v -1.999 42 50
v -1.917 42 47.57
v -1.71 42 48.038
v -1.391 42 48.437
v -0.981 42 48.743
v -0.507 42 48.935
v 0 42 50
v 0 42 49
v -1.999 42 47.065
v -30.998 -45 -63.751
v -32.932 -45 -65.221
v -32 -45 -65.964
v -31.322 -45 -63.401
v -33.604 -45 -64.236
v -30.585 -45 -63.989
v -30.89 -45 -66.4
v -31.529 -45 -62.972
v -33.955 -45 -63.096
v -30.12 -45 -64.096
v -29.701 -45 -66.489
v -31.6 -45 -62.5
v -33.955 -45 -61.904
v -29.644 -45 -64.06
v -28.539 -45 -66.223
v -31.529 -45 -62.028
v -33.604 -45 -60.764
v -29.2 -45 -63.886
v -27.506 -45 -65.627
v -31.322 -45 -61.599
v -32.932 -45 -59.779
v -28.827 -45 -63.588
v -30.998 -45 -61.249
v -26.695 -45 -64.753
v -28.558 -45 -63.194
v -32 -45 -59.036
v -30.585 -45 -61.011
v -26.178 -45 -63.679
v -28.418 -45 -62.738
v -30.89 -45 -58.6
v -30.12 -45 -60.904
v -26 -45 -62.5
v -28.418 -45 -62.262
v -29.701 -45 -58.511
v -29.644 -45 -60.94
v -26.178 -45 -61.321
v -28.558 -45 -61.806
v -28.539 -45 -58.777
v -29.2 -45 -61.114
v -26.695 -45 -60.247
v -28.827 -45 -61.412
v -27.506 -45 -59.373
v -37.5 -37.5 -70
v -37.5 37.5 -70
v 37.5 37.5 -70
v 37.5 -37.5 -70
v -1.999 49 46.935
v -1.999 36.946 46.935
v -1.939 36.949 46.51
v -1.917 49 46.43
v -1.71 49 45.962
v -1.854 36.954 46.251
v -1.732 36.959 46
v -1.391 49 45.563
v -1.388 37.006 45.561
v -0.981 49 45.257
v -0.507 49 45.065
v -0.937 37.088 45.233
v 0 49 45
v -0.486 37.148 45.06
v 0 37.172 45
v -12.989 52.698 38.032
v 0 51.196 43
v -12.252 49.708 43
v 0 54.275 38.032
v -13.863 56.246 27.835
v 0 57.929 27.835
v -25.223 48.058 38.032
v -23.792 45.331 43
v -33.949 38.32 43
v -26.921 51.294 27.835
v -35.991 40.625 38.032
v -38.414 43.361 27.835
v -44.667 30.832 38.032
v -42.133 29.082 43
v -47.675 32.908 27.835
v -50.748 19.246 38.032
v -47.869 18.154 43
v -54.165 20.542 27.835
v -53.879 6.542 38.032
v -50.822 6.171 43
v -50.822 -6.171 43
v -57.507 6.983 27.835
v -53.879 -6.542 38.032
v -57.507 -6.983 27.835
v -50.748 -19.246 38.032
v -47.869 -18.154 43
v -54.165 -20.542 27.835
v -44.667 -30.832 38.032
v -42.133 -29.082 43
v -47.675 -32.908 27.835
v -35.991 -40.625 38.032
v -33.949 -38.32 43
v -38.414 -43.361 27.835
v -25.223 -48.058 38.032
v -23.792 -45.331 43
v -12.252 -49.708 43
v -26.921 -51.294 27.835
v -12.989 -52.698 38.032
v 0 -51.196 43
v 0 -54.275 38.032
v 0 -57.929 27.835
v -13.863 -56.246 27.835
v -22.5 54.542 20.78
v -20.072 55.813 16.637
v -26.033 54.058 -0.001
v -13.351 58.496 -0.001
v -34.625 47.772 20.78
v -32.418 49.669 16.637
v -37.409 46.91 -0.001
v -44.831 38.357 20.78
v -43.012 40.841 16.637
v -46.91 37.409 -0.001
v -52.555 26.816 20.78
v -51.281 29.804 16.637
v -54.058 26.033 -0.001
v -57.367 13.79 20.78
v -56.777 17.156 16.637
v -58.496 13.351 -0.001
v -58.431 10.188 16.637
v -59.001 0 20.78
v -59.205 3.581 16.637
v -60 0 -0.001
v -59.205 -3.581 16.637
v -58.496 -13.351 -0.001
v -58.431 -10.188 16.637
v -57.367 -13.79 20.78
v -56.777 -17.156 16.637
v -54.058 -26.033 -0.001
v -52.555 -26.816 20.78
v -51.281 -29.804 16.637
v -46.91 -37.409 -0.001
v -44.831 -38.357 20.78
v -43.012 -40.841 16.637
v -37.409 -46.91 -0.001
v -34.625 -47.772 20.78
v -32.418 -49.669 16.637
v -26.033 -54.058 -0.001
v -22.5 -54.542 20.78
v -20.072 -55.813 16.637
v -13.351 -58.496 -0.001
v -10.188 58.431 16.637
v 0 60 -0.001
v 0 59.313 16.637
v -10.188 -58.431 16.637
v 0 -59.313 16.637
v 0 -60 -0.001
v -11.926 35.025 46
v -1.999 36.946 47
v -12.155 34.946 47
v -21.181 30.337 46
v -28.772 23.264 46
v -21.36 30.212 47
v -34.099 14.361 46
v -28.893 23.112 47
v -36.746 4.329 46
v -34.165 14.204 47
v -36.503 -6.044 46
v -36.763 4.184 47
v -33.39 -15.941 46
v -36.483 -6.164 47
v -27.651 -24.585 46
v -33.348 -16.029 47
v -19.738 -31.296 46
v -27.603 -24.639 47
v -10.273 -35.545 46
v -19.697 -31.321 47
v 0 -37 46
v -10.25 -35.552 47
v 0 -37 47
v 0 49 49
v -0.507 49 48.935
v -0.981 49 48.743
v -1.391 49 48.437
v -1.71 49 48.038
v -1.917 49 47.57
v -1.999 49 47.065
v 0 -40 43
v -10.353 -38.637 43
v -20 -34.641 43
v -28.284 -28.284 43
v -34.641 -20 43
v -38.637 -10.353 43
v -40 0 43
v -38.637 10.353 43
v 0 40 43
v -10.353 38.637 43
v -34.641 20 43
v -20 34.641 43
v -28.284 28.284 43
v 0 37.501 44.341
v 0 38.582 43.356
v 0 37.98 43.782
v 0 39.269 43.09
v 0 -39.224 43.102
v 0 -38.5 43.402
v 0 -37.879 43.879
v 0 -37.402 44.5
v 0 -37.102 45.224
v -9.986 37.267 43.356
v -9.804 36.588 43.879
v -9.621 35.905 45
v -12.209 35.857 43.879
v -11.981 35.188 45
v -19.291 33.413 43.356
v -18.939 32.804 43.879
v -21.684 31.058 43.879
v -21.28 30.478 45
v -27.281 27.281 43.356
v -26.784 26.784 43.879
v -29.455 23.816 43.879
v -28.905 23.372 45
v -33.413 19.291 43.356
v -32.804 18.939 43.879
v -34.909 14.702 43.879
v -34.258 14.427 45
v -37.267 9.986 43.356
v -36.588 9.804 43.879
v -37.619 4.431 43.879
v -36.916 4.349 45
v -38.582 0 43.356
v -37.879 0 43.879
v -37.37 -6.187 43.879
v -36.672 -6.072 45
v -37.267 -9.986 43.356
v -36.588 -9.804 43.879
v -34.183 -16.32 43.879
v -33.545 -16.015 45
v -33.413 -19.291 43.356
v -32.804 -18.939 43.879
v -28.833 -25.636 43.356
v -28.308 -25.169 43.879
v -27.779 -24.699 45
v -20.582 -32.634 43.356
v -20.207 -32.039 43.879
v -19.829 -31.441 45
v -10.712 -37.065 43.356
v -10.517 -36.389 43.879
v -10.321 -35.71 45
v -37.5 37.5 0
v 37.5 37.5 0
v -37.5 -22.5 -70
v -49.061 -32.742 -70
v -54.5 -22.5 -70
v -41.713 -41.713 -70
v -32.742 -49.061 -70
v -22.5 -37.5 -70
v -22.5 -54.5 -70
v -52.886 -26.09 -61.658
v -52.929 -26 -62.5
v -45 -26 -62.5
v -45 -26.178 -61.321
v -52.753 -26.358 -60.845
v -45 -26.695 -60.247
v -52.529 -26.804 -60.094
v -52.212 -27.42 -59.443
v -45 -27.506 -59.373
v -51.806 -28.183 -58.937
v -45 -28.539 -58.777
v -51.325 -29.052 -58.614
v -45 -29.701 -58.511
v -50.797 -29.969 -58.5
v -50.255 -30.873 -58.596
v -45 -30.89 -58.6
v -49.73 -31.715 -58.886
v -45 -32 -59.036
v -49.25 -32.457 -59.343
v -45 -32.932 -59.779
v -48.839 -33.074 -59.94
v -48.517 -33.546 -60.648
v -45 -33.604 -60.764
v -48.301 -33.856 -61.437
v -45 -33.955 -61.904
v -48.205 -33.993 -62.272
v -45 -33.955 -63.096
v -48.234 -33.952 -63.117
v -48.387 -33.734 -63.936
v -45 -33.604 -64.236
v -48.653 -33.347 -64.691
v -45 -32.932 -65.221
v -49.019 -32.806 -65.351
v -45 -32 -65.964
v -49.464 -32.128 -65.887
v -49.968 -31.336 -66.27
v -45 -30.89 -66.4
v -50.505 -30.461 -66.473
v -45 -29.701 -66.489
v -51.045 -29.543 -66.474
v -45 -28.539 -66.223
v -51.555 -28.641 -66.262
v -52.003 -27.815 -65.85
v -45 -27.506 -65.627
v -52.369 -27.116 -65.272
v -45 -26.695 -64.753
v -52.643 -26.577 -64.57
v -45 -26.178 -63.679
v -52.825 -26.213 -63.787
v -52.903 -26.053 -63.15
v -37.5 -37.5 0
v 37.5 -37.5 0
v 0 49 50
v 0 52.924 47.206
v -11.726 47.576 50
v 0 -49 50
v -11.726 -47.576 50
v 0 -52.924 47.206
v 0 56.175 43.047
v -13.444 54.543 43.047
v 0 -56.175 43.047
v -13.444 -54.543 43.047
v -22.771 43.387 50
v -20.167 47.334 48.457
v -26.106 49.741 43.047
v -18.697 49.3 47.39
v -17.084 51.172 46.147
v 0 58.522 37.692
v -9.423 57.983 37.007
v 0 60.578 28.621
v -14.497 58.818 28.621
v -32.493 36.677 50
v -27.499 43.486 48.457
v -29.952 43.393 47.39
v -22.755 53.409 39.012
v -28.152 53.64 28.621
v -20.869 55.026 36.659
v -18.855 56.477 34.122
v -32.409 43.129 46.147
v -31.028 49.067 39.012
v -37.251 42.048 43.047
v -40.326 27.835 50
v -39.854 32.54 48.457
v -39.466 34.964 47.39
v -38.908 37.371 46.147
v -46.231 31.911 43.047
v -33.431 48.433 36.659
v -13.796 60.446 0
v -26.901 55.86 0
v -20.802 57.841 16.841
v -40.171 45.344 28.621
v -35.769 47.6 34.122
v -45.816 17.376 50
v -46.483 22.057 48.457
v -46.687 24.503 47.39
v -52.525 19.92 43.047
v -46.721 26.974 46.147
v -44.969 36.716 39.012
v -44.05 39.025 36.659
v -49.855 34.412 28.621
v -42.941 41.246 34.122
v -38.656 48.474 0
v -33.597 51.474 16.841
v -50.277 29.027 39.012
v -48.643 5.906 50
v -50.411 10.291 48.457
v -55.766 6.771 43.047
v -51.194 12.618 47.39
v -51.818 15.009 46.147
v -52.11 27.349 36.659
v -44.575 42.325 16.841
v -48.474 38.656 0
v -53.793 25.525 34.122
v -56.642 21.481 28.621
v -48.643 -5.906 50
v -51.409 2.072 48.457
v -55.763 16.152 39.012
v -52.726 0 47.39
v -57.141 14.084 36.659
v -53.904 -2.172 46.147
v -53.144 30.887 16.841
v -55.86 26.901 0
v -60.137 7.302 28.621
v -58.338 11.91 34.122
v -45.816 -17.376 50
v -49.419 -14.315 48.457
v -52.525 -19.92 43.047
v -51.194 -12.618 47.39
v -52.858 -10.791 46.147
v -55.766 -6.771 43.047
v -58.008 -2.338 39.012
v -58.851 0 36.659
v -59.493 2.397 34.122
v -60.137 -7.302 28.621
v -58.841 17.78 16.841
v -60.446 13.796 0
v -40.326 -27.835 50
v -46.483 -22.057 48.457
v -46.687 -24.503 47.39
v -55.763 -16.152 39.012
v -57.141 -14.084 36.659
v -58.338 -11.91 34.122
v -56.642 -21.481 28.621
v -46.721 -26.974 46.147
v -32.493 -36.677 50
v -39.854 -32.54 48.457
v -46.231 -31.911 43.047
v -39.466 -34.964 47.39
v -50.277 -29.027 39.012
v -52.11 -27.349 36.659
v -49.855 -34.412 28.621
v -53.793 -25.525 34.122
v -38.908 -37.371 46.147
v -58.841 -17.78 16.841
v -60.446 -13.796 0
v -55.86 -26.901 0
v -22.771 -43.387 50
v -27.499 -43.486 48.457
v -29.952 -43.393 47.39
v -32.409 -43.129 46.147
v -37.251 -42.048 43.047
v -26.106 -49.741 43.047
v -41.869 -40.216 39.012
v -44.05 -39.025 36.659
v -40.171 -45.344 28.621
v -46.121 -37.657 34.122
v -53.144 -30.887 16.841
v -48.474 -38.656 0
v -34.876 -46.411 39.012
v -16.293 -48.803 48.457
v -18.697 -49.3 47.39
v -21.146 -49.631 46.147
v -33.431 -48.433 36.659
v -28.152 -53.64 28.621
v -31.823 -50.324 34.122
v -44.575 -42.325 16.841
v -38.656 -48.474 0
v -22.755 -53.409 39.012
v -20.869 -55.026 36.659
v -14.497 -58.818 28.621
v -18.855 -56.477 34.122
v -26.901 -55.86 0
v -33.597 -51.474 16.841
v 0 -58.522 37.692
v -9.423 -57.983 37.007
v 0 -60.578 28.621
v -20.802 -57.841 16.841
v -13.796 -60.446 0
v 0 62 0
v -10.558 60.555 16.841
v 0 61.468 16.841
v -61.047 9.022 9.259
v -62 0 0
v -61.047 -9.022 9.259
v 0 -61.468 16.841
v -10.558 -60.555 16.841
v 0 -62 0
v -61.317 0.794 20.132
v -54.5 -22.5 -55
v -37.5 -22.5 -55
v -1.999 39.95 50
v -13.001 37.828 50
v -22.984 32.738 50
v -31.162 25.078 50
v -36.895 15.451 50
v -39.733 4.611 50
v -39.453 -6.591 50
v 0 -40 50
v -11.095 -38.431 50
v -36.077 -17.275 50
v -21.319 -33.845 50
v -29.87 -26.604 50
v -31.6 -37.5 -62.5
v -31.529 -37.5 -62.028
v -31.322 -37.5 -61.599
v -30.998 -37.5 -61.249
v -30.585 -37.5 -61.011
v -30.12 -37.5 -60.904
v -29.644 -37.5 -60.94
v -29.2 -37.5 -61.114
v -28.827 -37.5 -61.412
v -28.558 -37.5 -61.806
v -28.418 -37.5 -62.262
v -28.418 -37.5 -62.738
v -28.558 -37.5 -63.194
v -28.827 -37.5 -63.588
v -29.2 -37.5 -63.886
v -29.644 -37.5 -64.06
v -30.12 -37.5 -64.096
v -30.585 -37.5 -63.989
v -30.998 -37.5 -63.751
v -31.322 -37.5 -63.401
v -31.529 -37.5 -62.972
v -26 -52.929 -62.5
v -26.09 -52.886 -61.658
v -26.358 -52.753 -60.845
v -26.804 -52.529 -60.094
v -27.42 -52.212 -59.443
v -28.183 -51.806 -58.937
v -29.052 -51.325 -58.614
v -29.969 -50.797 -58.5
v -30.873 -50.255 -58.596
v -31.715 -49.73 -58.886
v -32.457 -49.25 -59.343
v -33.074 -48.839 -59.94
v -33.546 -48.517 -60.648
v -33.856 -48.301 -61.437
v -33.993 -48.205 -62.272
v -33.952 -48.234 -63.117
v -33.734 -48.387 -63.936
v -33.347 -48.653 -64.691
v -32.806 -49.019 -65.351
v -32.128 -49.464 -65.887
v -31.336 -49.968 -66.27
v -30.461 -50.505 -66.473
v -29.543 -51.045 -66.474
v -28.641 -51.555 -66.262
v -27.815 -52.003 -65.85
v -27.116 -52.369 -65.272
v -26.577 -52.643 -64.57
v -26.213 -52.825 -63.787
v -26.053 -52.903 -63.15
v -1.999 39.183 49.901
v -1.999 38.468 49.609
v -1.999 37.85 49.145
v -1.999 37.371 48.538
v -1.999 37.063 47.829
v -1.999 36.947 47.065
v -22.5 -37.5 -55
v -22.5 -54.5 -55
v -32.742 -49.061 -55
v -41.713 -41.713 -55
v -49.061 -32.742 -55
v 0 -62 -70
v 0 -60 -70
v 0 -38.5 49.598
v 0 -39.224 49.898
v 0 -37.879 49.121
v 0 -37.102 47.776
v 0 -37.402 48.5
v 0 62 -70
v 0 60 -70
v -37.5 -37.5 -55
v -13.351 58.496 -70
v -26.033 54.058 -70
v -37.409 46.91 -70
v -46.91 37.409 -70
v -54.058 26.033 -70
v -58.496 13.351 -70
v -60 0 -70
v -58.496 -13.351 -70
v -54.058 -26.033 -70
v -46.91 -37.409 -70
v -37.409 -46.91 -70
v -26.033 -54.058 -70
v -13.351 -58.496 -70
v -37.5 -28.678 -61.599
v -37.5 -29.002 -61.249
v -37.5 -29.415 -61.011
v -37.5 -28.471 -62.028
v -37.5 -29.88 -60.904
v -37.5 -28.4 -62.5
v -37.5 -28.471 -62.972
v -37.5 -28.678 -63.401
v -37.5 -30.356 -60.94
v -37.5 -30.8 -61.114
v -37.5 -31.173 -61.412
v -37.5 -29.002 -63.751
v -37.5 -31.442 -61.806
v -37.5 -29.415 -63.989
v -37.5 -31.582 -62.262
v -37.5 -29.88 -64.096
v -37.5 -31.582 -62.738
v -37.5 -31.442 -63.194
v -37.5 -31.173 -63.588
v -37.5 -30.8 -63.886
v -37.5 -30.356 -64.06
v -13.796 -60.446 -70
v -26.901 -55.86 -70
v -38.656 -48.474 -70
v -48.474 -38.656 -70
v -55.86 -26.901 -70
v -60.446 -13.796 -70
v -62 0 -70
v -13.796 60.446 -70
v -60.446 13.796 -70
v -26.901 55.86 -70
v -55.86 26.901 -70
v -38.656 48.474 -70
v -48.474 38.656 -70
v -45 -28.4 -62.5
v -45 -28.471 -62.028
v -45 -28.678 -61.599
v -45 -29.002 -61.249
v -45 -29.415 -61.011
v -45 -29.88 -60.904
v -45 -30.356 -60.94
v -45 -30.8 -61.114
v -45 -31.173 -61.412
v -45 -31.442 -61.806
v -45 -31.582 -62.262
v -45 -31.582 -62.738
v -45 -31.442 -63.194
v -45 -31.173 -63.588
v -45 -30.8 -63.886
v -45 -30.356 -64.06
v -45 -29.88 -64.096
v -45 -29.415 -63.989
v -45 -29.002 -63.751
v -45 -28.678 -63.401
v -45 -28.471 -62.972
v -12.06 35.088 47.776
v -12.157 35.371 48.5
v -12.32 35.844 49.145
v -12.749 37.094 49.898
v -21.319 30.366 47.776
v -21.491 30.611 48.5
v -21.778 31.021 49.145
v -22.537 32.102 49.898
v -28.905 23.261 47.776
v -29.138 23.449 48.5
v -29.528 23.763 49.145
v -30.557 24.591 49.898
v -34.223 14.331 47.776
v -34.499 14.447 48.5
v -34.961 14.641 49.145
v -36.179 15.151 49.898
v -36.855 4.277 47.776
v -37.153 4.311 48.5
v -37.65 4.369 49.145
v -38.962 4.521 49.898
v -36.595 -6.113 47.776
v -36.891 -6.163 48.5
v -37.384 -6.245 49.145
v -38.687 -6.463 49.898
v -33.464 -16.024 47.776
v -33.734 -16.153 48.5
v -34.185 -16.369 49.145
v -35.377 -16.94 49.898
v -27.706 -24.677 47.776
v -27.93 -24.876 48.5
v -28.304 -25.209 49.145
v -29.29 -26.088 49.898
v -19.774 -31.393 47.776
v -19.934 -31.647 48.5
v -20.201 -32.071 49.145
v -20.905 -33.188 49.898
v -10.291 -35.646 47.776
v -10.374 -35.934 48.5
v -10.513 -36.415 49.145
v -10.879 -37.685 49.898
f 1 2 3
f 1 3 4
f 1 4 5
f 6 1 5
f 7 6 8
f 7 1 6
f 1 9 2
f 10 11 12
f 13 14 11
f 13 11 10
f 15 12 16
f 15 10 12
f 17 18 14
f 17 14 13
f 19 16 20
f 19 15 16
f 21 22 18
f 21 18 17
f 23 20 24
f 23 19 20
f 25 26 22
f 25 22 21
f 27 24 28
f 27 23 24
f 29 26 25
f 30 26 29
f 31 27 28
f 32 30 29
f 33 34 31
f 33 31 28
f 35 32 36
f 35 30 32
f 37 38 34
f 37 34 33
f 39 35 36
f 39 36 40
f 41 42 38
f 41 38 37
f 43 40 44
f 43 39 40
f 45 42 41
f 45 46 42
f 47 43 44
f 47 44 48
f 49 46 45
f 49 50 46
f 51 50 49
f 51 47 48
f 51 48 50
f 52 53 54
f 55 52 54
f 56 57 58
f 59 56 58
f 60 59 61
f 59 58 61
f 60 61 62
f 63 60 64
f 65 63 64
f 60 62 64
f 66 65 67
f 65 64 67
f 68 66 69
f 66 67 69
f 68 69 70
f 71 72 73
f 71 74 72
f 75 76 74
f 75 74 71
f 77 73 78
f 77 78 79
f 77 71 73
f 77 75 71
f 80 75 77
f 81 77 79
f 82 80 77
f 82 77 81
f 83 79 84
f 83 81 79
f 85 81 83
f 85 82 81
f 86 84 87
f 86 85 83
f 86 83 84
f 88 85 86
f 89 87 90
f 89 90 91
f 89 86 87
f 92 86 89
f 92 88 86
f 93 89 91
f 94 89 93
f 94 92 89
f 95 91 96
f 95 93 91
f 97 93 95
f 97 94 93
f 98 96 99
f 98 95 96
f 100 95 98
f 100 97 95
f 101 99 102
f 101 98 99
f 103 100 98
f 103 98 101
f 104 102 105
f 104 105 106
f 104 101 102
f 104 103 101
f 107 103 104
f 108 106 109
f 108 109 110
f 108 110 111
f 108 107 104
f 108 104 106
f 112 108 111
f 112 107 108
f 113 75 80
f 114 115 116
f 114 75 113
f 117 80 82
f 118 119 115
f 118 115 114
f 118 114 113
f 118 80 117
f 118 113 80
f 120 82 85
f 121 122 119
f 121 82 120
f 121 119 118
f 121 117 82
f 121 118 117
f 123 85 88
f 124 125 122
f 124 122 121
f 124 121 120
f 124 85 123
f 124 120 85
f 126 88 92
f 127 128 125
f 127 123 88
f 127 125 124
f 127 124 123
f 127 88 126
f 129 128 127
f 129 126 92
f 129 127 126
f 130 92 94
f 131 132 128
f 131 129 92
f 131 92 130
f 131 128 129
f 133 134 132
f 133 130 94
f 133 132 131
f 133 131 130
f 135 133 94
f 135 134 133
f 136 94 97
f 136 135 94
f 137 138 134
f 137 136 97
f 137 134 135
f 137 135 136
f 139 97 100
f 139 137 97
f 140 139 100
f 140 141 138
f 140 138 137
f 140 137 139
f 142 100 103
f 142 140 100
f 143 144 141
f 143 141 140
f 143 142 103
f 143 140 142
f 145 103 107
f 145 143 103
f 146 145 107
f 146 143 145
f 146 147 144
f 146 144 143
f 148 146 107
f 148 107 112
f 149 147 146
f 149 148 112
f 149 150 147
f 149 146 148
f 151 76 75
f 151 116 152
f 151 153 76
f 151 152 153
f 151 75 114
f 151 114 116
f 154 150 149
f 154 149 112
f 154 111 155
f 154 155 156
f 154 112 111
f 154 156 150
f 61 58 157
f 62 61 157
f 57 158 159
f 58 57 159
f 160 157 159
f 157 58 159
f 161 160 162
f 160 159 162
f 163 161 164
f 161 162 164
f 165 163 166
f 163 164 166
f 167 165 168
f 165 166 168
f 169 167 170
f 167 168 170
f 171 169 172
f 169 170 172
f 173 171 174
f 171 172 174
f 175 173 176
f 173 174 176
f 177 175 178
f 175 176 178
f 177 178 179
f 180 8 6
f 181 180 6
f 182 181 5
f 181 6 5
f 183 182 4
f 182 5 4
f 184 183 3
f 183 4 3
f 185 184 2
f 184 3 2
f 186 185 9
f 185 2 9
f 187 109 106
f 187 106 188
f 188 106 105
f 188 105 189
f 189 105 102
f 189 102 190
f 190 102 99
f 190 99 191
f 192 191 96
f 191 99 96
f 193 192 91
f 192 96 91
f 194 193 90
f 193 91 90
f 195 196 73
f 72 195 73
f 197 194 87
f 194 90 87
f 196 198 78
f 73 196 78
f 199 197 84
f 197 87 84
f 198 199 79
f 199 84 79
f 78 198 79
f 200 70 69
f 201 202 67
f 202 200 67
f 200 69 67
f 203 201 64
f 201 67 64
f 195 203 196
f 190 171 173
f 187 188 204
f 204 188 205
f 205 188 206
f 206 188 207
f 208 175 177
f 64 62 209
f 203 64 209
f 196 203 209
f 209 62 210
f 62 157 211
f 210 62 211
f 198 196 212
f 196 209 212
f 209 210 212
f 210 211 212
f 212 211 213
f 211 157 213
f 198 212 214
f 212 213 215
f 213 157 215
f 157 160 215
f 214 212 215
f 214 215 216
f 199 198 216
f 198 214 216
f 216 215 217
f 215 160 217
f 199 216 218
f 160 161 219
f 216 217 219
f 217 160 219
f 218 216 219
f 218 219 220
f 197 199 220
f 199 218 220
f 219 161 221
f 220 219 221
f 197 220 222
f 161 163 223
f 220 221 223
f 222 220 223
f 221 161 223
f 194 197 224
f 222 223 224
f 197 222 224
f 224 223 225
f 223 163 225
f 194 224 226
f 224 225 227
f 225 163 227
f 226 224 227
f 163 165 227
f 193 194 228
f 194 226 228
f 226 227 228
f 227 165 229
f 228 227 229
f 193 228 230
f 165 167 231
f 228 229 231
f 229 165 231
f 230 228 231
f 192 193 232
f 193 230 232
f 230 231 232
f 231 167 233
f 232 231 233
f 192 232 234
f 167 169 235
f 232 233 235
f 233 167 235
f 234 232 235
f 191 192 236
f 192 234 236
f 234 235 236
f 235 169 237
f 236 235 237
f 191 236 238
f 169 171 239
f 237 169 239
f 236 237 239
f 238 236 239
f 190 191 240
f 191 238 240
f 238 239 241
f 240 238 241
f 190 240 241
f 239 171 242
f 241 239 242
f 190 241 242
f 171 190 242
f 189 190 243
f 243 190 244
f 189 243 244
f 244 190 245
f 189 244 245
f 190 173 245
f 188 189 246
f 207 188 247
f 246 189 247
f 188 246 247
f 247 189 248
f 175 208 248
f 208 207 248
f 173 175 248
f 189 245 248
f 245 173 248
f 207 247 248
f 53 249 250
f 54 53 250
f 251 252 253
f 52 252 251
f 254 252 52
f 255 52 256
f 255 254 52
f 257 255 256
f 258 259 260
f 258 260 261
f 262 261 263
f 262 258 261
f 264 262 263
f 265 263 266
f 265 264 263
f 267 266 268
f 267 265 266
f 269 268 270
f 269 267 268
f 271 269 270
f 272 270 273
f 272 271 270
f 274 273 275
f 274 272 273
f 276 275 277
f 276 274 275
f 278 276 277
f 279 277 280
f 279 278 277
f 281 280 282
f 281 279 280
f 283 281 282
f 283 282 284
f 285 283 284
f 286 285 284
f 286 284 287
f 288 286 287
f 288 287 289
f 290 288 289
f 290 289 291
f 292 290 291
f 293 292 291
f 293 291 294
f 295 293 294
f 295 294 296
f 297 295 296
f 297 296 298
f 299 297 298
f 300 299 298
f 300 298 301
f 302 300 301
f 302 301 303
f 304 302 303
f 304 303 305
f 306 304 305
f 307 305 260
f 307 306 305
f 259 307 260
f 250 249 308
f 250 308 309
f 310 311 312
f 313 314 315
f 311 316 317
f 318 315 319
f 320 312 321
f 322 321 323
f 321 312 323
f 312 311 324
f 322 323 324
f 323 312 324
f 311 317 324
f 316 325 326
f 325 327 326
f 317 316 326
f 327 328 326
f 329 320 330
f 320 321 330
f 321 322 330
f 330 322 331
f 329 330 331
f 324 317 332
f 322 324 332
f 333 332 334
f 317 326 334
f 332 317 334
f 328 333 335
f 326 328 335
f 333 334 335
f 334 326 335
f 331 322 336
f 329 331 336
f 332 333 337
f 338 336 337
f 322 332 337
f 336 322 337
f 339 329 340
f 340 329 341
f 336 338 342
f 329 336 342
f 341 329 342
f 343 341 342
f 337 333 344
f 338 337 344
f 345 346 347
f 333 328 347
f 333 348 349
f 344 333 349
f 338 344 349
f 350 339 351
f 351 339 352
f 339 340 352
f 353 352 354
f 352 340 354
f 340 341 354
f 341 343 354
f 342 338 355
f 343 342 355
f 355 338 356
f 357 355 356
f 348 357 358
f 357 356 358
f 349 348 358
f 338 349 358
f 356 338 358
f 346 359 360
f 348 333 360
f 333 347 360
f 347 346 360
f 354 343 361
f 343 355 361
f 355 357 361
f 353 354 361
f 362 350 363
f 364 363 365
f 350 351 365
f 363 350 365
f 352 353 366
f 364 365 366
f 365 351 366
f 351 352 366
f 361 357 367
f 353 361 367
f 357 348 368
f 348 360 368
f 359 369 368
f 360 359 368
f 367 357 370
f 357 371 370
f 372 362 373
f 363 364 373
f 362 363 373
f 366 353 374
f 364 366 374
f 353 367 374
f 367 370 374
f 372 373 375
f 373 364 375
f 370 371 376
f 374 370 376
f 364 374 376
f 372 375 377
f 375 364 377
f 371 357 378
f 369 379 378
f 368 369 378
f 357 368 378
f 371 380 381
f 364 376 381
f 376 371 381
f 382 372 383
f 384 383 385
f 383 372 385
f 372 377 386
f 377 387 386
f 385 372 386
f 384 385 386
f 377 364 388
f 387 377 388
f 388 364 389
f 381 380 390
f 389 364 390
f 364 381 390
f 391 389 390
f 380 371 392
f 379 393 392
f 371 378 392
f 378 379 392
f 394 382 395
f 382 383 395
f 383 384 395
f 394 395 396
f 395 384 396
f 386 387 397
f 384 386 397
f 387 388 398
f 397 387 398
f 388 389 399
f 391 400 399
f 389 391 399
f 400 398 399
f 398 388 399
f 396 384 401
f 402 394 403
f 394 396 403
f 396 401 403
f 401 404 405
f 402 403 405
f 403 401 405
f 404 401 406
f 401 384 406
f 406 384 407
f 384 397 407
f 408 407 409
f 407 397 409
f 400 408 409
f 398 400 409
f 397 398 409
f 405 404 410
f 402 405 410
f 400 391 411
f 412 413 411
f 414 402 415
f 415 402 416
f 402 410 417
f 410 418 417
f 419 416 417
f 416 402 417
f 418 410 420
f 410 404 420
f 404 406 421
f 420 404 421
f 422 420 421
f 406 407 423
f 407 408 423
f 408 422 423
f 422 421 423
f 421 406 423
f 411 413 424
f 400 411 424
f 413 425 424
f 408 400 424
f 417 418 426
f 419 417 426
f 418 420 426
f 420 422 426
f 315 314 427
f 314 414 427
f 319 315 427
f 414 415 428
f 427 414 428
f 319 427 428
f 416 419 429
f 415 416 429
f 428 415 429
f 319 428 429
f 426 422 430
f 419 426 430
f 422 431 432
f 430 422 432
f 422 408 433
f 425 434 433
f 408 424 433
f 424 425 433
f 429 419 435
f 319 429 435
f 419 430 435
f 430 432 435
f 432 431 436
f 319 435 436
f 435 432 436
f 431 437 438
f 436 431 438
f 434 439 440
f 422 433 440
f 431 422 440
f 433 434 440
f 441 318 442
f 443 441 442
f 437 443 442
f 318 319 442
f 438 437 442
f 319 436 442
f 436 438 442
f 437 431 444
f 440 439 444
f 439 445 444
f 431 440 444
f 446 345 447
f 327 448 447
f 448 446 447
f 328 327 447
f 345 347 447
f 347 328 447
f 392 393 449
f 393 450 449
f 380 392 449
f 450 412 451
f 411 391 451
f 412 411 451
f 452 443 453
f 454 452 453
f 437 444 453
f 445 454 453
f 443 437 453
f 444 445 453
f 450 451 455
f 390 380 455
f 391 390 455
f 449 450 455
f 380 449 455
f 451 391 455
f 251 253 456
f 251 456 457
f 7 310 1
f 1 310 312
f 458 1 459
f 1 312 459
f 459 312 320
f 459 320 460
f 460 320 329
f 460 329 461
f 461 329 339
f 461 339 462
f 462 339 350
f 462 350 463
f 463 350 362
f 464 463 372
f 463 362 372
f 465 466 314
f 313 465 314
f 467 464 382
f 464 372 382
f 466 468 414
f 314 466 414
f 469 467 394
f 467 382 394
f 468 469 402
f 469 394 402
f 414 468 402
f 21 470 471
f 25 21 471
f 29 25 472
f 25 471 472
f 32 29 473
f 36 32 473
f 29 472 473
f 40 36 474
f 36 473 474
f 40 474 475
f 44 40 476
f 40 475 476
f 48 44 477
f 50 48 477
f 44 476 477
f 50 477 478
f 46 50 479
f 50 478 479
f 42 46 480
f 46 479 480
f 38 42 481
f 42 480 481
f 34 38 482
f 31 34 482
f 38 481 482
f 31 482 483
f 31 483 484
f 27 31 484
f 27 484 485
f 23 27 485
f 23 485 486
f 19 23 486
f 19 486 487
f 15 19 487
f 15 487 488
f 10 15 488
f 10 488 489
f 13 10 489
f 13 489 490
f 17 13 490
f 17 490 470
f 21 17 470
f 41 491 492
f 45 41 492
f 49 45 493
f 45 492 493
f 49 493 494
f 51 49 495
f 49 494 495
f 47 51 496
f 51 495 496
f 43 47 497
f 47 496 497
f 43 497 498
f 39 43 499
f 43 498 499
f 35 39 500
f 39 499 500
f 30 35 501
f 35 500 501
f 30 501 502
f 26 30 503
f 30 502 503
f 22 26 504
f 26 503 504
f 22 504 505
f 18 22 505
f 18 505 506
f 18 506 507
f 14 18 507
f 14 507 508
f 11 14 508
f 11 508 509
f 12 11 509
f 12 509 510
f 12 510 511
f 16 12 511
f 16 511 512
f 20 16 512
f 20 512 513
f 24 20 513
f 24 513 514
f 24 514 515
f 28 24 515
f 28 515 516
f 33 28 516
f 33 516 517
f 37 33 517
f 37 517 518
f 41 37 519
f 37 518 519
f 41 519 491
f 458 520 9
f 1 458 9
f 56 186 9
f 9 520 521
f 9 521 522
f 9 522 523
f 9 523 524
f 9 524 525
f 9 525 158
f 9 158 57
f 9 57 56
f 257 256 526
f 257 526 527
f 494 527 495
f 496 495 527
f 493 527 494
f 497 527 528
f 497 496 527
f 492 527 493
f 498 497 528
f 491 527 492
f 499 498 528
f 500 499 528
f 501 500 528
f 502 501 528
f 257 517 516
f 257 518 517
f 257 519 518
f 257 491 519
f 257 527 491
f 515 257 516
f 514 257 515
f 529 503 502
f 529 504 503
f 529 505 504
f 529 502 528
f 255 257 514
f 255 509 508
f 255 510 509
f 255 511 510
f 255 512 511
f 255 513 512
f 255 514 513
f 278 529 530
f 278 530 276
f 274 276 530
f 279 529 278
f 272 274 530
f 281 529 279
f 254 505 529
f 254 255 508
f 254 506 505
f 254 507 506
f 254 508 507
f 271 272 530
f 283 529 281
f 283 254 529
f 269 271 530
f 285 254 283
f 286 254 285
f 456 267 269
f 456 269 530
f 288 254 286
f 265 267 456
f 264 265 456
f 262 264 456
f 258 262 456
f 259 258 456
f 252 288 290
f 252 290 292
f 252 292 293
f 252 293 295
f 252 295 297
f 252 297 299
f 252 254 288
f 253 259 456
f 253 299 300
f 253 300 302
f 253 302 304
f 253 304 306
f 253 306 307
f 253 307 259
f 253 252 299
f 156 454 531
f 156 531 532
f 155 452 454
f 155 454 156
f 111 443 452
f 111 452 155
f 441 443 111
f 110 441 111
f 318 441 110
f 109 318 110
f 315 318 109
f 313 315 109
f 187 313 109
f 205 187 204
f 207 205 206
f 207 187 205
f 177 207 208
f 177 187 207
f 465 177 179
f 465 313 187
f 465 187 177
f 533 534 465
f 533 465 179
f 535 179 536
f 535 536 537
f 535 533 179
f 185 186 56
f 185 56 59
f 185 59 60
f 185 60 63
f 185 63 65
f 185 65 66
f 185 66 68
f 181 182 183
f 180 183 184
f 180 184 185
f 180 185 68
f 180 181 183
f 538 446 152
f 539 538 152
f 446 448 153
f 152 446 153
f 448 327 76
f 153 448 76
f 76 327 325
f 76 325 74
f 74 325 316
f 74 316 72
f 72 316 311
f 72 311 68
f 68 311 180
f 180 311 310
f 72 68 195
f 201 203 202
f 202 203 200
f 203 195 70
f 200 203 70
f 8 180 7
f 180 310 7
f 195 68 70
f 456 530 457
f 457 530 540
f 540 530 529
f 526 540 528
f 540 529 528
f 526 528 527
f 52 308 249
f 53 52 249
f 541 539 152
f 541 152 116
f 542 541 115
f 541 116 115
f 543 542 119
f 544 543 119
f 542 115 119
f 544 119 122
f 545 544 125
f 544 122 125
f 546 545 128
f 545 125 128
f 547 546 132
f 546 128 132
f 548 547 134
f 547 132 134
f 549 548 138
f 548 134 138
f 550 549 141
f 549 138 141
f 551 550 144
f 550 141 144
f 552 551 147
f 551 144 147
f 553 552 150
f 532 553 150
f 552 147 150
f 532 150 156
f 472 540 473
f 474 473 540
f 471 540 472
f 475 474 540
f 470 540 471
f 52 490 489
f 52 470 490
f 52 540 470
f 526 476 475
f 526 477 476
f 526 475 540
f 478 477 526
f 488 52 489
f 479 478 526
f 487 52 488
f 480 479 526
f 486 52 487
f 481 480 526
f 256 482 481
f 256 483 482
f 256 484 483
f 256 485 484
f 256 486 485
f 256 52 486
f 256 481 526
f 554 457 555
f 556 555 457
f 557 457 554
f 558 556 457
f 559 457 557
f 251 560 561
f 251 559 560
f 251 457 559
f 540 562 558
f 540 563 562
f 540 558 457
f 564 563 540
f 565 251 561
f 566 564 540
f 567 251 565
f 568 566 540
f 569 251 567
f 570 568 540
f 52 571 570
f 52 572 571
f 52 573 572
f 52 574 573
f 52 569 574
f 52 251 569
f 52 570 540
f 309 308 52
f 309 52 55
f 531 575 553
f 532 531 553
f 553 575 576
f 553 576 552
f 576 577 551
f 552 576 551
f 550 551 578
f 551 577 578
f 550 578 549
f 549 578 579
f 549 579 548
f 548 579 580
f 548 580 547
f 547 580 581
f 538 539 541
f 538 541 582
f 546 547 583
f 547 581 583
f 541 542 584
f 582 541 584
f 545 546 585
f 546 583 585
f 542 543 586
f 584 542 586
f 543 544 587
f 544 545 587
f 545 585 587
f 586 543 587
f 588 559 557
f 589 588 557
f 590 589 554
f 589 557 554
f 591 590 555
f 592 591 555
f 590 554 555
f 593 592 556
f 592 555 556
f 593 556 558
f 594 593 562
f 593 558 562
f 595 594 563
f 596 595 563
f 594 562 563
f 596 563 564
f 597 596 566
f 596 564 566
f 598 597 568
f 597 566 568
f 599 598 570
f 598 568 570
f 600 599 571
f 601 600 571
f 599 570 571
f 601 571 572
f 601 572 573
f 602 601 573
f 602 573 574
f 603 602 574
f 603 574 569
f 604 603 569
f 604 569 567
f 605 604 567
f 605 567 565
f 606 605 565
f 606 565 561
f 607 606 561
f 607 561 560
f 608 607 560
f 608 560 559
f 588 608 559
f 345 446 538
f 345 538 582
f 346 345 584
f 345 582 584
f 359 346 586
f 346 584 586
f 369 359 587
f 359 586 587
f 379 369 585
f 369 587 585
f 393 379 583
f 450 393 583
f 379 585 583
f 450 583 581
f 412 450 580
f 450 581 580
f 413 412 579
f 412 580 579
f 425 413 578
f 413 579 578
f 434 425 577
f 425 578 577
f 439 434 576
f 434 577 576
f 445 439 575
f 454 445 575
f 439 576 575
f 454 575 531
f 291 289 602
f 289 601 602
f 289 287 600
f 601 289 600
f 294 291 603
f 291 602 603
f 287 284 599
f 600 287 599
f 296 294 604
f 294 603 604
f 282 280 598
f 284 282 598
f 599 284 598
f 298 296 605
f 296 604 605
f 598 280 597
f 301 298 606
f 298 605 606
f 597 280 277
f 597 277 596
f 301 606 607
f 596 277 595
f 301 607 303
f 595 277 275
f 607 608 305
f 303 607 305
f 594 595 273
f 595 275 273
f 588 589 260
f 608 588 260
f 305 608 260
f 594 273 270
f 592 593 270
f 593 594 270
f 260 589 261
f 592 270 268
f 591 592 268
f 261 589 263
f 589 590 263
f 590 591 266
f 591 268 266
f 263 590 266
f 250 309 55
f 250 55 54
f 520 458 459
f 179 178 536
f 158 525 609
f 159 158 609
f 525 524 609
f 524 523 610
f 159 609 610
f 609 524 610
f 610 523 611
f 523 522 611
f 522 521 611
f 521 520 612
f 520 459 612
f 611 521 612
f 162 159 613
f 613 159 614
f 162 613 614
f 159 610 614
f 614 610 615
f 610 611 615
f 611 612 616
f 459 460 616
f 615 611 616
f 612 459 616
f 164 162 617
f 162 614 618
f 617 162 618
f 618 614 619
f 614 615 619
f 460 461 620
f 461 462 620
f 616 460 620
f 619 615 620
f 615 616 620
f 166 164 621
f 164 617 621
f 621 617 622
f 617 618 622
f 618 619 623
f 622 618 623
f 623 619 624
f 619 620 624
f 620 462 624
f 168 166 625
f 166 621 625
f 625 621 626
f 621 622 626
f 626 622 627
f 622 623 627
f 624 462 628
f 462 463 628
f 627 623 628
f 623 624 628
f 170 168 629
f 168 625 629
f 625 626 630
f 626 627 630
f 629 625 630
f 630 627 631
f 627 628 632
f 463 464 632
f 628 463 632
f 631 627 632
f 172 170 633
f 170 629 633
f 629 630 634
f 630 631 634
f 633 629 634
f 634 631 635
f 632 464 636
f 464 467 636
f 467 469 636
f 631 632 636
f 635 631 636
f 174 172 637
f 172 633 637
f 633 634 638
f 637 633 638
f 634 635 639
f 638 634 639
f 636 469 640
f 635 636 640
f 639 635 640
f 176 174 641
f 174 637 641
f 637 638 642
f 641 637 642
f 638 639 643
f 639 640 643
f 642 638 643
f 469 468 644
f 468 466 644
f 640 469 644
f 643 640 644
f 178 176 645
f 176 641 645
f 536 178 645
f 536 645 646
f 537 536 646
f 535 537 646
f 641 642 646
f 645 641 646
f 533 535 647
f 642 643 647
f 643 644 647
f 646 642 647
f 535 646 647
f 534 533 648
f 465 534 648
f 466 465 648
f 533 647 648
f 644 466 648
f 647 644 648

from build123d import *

# Parameters (mm, degrees)
F1_ANGLE_BACK = 90
F1_ANGLE      = 180
F3_DEPTH      = 49
F4_DEPTH      = 42
F5_W          = 75
F5_H          = 75
F6_DEPTH      = 70
F8_DEPTH      = 15
F9_R          = 1.6
F10_DEPTH     = 15
F12_R         = 4
F13_DEPTH     = 15
F14_R         = 1.6
F15_DEPTH     = 15
F17_R         = 4
F18_DEPTH     = 15


with BuildPart() as f1:
    # F0 (on Front) → F1 (revolve)
    with BuildSketch(Plane.XZ, mode=Mode.PRIVATE) as f1_sk:
        with BuildLine():
            ThreePointArc((-37, 47), (-37.8786796564, 49.1213203436), (-40, 50))
            Line((-40, 50), (-49, 50))
            add(Edge.make_bspline(
                [(-49, 50), (-50.0905438599, 49.4592544488), (-53.0493875637, 47.4989733534), (-57.4486951492, 41.931344871), (-61.5763053799, 28.0443008729), (-61.4881986154, 14.5014666819), (-62, 0)],
                knots=[0, 0, 0, 0, 0.1531073754, 0.3436852098, 0.6019385566, 1, 1, 1, 1], degree=3))
            Line((-62, 0), (-62, -70))
            Line((-62, -70), (-60, -70))
            Line((-60, -70), (-60, -0.0007486343))
            add(Edge.make_bspline(
                [(-51.1955396277, 43), (-52.5935031474, 41.0496741533), (-52.9517254174, 40.8807945198), (-59.4148587907, 27.5741318966), (-59.3836485459, 15.4725515941), (-60, -0.0007486343)],
                knots=[0, 0, 0, 0, 0.1766813791, 0.4834568095, 1, 1, 1, 1], degree=3))
            Line((-51.1955396277, 43), (-40, 43))
            ThreePointArc((-40, 43), (-37.8786796564, 43.8786796564), (-37, 46))
            Line((-37, 46), (-37, 47))
        make_face()
    revolve(f1_sk.sketch.rotate(Axis((0, 0, -69.538783133), (0, 0, 1)), -F1_ANGLE_BACK), axis=Axis((0, 0, -69.538783133), (0, 0, 1)), revolution_arc=F1_ANGLE)

    # F2 (on Front) → F3 (cut)
    with BuildSketch(Plane.XZ):
        with BuildLine():
            ThreePointArc((0, 45), (1.4142135624, 45.5857864376), (2, 47))
            ThreePointArc((2, 47), (1.4142135624, 48.4142135624), (0, 49))
            ThreePointArc((0, 49), (-1.3909130574, 48.4371363424), (-1.998931704, 47.0653608667))
            Line((-1.998931704, 47.0653608667), (-1.998931704, 46.9346391333))
            ThreePointArc((-1.998931704, 46.9346391333), (-1.3909130574, 45.5628636576), (0, 45))
        make_face()
    extrude(amount=-F3_DEPTH, mode=Mode.SUBTRACT)

    # F2 (on Front) → F4 (cut)
    with BuildSketch(Plane.XZ):
        with BuildLine():
            ThreePointArc((-1.998931704, 47.0653608667), (-1.3909130574, 48.4371363424), (0, 49))
            Line((0, 49), (0, 50.3604523001))
            Line((0, 50.3604523001), (-1.998931704, 50.3604523001))
            Line((-1.998931704, 50.3604523001), (-1.998931704, 47.0653608667))
        make_face()
    extrude(amount=-F4_DEPTH, mode=Mode.SUBTRACT)


with BuildPart() as f6:
    # F5 (on Top) → F6 (new body)
    with BuildSketch(Plane.XY):
        Rectangle(F5_W, F5_H)
    extrude(amount=-F6_DEPTH)


with BuildPart() as f8:
    # F7 (on face) → F8 (new body)
    with BuildSketch(Plane(origin=(0, 0, -70), x_dir=(1, 0, 0), z_dir=(0, 0, -1))):
        with BuildLine():
            Line((-37.5, 22.5), (-37.5, 37.5))
            Line((-37.5, 37.5), (-22.5, 37.5))
            Line((-22.5, 37.5), (-22.5, 54.5))
            ThreePointArc((-22.5, 54.5), (-41.7128787943, 41.7128787943), (-54.5, 22.5))
            Line((-54.5, 22.5), (-37.5, 22.5))
        make_face()
    extrude(amount=-F8_DEPTH)

    # F9 (on face) → F10 (cut)
    with BuildSketch(Plane.YZ.offset(-37.5)):
        with Locations((-30, -62.5)):
            Circle(F9_R)
    extrude(amount=-F10_DEPTH, mode=Mode.SUBTRACT)

    # F12 (on offset) → F13 (cut)
    with BuildSketch(Plane.YZ.offset(-60)):
        with Locations((-30, -62.5)):
            Circle(F12_R)
    extrude(amount=F13_DEPTH, mode=Mode.SUBTRACT)

    # F14 (on face) → F15 (cut)
    with BuildSketch(Plane(origin=(0, -37.5, 0), x_dir=(-1, 0, 0), z_dir=(0, 1, 0))):
        with Locations((30, -62.5)):
            Circle(F14_R)
    extrude(amount=-F15_DEPTH, mode=Mode.SUBTRACT)

    # F17 (on offset) → F18 (cut)
    with BuildSketch(Plane.XZ.offset(60)):
        with Locations((-30, -62.5)):
            Circle(F17_R)
    extrude(amount=-F18_DEPTH, mode=Mode.SUBTRACT)


solid = Compound([f1.part, f6.part, f8.part])
